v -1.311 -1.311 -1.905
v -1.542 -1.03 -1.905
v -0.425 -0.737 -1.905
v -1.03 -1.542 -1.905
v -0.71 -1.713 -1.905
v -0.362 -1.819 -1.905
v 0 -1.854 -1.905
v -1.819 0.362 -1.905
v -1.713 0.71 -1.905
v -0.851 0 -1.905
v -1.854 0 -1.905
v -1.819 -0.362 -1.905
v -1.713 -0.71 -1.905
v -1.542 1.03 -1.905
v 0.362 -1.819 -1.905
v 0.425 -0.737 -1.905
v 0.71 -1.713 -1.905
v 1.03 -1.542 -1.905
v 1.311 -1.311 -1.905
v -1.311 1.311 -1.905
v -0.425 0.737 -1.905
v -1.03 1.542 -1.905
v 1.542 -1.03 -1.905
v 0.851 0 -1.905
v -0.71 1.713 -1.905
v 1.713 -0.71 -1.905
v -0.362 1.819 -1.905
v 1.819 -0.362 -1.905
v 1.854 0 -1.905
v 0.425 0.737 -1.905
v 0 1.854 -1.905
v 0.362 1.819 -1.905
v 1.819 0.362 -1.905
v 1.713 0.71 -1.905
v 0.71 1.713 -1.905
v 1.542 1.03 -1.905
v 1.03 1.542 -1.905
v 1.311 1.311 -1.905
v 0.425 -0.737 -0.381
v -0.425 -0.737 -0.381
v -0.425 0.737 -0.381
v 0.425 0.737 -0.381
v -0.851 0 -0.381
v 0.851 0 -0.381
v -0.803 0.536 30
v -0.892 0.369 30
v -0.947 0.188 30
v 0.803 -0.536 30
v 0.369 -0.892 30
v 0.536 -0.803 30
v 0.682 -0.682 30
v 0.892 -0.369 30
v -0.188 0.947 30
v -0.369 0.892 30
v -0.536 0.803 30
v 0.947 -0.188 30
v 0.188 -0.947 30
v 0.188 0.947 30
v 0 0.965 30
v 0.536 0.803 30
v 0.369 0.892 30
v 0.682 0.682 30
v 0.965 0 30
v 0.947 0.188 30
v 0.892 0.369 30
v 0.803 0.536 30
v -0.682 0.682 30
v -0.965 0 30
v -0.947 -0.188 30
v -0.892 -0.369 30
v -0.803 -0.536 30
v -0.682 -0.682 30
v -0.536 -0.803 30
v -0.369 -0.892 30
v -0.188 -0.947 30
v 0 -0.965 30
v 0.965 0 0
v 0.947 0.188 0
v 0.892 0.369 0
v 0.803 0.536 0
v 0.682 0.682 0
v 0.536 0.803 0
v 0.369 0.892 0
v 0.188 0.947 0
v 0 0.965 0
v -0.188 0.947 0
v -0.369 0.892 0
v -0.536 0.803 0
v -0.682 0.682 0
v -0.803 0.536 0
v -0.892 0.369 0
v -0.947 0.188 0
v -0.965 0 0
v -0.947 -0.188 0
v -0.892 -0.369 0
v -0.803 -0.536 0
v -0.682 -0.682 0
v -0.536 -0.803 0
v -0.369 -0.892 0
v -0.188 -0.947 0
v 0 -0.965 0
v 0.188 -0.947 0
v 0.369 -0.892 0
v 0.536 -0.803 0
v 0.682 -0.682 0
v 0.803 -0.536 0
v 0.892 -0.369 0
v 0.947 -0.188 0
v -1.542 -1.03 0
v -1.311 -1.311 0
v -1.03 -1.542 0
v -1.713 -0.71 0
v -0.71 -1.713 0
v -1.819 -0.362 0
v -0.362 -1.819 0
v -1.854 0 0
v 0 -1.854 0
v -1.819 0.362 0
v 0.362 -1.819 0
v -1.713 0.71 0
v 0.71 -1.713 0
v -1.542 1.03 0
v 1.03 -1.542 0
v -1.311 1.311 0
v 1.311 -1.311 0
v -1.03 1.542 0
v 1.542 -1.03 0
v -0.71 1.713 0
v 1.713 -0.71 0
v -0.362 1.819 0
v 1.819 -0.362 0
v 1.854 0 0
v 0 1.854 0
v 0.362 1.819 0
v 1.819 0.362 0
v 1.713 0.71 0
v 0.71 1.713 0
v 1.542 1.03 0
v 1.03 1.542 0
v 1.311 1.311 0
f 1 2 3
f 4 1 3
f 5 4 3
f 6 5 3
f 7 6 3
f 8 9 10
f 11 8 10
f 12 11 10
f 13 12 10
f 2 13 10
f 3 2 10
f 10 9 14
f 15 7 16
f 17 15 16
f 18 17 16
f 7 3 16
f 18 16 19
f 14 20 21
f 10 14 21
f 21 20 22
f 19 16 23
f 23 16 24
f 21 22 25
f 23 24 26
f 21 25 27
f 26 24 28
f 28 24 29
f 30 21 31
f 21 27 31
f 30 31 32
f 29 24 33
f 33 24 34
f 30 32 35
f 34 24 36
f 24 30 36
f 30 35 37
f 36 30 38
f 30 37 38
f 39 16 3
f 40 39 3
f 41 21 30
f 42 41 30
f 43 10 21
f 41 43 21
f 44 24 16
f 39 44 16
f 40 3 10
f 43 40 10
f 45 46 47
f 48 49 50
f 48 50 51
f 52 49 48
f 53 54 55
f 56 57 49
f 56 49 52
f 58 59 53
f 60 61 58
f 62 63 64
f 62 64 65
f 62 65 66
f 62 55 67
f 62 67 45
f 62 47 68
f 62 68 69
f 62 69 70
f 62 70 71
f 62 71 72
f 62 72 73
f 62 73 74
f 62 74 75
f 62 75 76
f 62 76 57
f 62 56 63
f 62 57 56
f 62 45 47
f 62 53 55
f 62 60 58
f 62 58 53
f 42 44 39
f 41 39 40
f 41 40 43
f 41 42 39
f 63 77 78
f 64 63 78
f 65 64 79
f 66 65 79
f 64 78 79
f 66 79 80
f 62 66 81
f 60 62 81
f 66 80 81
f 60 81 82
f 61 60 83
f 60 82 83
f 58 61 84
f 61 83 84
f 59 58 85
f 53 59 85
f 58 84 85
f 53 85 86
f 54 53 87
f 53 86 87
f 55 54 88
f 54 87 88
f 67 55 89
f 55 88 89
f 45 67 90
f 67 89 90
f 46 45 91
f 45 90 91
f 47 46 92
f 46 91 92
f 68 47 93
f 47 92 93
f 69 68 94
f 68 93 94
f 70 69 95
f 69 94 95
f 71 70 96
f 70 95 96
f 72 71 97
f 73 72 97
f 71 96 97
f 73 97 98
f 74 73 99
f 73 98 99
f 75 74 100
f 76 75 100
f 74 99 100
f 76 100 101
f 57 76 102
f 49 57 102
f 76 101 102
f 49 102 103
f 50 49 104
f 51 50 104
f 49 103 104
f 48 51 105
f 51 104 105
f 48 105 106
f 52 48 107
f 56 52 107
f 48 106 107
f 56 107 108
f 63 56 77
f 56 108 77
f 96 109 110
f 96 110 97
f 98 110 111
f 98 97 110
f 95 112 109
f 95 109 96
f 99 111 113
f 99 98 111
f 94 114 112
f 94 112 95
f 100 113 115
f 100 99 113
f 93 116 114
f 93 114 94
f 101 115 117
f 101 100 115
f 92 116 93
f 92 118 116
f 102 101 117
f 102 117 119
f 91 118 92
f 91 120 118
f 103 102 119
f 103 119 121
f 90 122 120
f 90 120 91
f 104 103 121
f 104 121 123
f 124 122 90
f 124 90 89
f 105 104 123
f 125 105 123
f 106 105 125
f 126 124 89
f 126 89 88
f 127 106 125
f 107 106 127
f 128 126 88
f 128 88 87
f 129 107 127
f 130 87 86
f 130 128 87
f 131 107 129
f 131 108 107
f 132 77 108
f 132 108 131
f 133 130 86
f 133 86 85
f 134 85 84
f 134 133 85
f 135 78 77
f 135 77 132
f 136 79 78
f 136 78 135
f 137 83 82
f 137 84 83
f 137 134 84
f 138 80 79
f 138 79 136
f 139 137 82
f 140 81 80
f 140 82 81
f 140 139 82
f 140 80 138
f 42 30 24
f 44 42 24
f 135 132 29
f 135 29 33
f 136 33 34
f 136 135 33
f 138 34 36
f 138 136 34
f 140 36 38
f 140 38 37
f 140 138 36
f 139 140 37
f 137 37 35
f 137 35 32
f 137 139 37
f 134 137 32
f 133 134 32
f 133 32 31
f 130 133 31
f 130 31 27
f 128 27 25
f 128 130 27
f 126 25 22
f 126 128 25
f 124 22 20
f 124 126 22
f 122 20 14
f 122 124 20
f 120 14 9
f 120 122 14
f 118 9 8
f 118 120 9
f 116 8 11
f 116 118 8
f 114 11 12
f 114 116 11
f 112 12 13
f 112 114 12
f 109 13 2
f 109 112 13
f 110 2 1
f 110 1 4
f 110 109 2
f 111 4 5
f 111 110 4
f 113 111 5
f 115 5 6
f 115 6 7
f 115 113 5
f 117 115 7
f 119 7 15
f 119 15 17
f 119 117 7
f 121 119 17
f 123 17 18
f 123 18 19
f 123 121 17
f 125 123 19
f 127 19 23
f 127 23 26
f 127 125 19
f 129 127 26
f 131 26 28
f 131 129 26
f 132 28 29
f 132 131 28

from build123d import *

# Parameters (mm, degrees)
SKETCH1_R           = 0.9652
BOSS_EXTRUDE1_DEPTH = 30
SKETCH2_R           = 1.8542
BOSS_EXTRUDE2_DEPTH = 1.905
CUT_EXTRUDE1_DEPTH  = 1.524


with BuildPart() as part:
    # Sketch1 → Boss-Extrude1 (new body)
    with BuildSketch(Plane.XY):
        Circle(SKETCH1_R)
    extrude(amount=BOSS_EXTRUDE1_DEPTH)

    # Sketch2 → Boss-Extrude2 (add)
    with BuildSketch(Plane.XY):
        Circle(SKETCH2_R)
    extrude(amount=-BOSS_EXTRUDE2_DEPTH)

    # Sketch3 → Cut-Extrude1 (cut)
    with BuildSketch(Plane(origin=(0, 0, -1.905), x_dir=(-1, 0, 0), z_dir=(0, 0, -1))):
        Polygon((0.850552417, 0), (0.425276208, 0.7366), (-0.425276208, 0.7366), (-0.850552417, 0), (-0.425276208, -0.7366), (0.425276208, -0.7366), align=None)
    extrude(amount=-CUT_EXTRUDE1_DEPTH, mode=Mode.SUBTRACT)


solid = part.part
